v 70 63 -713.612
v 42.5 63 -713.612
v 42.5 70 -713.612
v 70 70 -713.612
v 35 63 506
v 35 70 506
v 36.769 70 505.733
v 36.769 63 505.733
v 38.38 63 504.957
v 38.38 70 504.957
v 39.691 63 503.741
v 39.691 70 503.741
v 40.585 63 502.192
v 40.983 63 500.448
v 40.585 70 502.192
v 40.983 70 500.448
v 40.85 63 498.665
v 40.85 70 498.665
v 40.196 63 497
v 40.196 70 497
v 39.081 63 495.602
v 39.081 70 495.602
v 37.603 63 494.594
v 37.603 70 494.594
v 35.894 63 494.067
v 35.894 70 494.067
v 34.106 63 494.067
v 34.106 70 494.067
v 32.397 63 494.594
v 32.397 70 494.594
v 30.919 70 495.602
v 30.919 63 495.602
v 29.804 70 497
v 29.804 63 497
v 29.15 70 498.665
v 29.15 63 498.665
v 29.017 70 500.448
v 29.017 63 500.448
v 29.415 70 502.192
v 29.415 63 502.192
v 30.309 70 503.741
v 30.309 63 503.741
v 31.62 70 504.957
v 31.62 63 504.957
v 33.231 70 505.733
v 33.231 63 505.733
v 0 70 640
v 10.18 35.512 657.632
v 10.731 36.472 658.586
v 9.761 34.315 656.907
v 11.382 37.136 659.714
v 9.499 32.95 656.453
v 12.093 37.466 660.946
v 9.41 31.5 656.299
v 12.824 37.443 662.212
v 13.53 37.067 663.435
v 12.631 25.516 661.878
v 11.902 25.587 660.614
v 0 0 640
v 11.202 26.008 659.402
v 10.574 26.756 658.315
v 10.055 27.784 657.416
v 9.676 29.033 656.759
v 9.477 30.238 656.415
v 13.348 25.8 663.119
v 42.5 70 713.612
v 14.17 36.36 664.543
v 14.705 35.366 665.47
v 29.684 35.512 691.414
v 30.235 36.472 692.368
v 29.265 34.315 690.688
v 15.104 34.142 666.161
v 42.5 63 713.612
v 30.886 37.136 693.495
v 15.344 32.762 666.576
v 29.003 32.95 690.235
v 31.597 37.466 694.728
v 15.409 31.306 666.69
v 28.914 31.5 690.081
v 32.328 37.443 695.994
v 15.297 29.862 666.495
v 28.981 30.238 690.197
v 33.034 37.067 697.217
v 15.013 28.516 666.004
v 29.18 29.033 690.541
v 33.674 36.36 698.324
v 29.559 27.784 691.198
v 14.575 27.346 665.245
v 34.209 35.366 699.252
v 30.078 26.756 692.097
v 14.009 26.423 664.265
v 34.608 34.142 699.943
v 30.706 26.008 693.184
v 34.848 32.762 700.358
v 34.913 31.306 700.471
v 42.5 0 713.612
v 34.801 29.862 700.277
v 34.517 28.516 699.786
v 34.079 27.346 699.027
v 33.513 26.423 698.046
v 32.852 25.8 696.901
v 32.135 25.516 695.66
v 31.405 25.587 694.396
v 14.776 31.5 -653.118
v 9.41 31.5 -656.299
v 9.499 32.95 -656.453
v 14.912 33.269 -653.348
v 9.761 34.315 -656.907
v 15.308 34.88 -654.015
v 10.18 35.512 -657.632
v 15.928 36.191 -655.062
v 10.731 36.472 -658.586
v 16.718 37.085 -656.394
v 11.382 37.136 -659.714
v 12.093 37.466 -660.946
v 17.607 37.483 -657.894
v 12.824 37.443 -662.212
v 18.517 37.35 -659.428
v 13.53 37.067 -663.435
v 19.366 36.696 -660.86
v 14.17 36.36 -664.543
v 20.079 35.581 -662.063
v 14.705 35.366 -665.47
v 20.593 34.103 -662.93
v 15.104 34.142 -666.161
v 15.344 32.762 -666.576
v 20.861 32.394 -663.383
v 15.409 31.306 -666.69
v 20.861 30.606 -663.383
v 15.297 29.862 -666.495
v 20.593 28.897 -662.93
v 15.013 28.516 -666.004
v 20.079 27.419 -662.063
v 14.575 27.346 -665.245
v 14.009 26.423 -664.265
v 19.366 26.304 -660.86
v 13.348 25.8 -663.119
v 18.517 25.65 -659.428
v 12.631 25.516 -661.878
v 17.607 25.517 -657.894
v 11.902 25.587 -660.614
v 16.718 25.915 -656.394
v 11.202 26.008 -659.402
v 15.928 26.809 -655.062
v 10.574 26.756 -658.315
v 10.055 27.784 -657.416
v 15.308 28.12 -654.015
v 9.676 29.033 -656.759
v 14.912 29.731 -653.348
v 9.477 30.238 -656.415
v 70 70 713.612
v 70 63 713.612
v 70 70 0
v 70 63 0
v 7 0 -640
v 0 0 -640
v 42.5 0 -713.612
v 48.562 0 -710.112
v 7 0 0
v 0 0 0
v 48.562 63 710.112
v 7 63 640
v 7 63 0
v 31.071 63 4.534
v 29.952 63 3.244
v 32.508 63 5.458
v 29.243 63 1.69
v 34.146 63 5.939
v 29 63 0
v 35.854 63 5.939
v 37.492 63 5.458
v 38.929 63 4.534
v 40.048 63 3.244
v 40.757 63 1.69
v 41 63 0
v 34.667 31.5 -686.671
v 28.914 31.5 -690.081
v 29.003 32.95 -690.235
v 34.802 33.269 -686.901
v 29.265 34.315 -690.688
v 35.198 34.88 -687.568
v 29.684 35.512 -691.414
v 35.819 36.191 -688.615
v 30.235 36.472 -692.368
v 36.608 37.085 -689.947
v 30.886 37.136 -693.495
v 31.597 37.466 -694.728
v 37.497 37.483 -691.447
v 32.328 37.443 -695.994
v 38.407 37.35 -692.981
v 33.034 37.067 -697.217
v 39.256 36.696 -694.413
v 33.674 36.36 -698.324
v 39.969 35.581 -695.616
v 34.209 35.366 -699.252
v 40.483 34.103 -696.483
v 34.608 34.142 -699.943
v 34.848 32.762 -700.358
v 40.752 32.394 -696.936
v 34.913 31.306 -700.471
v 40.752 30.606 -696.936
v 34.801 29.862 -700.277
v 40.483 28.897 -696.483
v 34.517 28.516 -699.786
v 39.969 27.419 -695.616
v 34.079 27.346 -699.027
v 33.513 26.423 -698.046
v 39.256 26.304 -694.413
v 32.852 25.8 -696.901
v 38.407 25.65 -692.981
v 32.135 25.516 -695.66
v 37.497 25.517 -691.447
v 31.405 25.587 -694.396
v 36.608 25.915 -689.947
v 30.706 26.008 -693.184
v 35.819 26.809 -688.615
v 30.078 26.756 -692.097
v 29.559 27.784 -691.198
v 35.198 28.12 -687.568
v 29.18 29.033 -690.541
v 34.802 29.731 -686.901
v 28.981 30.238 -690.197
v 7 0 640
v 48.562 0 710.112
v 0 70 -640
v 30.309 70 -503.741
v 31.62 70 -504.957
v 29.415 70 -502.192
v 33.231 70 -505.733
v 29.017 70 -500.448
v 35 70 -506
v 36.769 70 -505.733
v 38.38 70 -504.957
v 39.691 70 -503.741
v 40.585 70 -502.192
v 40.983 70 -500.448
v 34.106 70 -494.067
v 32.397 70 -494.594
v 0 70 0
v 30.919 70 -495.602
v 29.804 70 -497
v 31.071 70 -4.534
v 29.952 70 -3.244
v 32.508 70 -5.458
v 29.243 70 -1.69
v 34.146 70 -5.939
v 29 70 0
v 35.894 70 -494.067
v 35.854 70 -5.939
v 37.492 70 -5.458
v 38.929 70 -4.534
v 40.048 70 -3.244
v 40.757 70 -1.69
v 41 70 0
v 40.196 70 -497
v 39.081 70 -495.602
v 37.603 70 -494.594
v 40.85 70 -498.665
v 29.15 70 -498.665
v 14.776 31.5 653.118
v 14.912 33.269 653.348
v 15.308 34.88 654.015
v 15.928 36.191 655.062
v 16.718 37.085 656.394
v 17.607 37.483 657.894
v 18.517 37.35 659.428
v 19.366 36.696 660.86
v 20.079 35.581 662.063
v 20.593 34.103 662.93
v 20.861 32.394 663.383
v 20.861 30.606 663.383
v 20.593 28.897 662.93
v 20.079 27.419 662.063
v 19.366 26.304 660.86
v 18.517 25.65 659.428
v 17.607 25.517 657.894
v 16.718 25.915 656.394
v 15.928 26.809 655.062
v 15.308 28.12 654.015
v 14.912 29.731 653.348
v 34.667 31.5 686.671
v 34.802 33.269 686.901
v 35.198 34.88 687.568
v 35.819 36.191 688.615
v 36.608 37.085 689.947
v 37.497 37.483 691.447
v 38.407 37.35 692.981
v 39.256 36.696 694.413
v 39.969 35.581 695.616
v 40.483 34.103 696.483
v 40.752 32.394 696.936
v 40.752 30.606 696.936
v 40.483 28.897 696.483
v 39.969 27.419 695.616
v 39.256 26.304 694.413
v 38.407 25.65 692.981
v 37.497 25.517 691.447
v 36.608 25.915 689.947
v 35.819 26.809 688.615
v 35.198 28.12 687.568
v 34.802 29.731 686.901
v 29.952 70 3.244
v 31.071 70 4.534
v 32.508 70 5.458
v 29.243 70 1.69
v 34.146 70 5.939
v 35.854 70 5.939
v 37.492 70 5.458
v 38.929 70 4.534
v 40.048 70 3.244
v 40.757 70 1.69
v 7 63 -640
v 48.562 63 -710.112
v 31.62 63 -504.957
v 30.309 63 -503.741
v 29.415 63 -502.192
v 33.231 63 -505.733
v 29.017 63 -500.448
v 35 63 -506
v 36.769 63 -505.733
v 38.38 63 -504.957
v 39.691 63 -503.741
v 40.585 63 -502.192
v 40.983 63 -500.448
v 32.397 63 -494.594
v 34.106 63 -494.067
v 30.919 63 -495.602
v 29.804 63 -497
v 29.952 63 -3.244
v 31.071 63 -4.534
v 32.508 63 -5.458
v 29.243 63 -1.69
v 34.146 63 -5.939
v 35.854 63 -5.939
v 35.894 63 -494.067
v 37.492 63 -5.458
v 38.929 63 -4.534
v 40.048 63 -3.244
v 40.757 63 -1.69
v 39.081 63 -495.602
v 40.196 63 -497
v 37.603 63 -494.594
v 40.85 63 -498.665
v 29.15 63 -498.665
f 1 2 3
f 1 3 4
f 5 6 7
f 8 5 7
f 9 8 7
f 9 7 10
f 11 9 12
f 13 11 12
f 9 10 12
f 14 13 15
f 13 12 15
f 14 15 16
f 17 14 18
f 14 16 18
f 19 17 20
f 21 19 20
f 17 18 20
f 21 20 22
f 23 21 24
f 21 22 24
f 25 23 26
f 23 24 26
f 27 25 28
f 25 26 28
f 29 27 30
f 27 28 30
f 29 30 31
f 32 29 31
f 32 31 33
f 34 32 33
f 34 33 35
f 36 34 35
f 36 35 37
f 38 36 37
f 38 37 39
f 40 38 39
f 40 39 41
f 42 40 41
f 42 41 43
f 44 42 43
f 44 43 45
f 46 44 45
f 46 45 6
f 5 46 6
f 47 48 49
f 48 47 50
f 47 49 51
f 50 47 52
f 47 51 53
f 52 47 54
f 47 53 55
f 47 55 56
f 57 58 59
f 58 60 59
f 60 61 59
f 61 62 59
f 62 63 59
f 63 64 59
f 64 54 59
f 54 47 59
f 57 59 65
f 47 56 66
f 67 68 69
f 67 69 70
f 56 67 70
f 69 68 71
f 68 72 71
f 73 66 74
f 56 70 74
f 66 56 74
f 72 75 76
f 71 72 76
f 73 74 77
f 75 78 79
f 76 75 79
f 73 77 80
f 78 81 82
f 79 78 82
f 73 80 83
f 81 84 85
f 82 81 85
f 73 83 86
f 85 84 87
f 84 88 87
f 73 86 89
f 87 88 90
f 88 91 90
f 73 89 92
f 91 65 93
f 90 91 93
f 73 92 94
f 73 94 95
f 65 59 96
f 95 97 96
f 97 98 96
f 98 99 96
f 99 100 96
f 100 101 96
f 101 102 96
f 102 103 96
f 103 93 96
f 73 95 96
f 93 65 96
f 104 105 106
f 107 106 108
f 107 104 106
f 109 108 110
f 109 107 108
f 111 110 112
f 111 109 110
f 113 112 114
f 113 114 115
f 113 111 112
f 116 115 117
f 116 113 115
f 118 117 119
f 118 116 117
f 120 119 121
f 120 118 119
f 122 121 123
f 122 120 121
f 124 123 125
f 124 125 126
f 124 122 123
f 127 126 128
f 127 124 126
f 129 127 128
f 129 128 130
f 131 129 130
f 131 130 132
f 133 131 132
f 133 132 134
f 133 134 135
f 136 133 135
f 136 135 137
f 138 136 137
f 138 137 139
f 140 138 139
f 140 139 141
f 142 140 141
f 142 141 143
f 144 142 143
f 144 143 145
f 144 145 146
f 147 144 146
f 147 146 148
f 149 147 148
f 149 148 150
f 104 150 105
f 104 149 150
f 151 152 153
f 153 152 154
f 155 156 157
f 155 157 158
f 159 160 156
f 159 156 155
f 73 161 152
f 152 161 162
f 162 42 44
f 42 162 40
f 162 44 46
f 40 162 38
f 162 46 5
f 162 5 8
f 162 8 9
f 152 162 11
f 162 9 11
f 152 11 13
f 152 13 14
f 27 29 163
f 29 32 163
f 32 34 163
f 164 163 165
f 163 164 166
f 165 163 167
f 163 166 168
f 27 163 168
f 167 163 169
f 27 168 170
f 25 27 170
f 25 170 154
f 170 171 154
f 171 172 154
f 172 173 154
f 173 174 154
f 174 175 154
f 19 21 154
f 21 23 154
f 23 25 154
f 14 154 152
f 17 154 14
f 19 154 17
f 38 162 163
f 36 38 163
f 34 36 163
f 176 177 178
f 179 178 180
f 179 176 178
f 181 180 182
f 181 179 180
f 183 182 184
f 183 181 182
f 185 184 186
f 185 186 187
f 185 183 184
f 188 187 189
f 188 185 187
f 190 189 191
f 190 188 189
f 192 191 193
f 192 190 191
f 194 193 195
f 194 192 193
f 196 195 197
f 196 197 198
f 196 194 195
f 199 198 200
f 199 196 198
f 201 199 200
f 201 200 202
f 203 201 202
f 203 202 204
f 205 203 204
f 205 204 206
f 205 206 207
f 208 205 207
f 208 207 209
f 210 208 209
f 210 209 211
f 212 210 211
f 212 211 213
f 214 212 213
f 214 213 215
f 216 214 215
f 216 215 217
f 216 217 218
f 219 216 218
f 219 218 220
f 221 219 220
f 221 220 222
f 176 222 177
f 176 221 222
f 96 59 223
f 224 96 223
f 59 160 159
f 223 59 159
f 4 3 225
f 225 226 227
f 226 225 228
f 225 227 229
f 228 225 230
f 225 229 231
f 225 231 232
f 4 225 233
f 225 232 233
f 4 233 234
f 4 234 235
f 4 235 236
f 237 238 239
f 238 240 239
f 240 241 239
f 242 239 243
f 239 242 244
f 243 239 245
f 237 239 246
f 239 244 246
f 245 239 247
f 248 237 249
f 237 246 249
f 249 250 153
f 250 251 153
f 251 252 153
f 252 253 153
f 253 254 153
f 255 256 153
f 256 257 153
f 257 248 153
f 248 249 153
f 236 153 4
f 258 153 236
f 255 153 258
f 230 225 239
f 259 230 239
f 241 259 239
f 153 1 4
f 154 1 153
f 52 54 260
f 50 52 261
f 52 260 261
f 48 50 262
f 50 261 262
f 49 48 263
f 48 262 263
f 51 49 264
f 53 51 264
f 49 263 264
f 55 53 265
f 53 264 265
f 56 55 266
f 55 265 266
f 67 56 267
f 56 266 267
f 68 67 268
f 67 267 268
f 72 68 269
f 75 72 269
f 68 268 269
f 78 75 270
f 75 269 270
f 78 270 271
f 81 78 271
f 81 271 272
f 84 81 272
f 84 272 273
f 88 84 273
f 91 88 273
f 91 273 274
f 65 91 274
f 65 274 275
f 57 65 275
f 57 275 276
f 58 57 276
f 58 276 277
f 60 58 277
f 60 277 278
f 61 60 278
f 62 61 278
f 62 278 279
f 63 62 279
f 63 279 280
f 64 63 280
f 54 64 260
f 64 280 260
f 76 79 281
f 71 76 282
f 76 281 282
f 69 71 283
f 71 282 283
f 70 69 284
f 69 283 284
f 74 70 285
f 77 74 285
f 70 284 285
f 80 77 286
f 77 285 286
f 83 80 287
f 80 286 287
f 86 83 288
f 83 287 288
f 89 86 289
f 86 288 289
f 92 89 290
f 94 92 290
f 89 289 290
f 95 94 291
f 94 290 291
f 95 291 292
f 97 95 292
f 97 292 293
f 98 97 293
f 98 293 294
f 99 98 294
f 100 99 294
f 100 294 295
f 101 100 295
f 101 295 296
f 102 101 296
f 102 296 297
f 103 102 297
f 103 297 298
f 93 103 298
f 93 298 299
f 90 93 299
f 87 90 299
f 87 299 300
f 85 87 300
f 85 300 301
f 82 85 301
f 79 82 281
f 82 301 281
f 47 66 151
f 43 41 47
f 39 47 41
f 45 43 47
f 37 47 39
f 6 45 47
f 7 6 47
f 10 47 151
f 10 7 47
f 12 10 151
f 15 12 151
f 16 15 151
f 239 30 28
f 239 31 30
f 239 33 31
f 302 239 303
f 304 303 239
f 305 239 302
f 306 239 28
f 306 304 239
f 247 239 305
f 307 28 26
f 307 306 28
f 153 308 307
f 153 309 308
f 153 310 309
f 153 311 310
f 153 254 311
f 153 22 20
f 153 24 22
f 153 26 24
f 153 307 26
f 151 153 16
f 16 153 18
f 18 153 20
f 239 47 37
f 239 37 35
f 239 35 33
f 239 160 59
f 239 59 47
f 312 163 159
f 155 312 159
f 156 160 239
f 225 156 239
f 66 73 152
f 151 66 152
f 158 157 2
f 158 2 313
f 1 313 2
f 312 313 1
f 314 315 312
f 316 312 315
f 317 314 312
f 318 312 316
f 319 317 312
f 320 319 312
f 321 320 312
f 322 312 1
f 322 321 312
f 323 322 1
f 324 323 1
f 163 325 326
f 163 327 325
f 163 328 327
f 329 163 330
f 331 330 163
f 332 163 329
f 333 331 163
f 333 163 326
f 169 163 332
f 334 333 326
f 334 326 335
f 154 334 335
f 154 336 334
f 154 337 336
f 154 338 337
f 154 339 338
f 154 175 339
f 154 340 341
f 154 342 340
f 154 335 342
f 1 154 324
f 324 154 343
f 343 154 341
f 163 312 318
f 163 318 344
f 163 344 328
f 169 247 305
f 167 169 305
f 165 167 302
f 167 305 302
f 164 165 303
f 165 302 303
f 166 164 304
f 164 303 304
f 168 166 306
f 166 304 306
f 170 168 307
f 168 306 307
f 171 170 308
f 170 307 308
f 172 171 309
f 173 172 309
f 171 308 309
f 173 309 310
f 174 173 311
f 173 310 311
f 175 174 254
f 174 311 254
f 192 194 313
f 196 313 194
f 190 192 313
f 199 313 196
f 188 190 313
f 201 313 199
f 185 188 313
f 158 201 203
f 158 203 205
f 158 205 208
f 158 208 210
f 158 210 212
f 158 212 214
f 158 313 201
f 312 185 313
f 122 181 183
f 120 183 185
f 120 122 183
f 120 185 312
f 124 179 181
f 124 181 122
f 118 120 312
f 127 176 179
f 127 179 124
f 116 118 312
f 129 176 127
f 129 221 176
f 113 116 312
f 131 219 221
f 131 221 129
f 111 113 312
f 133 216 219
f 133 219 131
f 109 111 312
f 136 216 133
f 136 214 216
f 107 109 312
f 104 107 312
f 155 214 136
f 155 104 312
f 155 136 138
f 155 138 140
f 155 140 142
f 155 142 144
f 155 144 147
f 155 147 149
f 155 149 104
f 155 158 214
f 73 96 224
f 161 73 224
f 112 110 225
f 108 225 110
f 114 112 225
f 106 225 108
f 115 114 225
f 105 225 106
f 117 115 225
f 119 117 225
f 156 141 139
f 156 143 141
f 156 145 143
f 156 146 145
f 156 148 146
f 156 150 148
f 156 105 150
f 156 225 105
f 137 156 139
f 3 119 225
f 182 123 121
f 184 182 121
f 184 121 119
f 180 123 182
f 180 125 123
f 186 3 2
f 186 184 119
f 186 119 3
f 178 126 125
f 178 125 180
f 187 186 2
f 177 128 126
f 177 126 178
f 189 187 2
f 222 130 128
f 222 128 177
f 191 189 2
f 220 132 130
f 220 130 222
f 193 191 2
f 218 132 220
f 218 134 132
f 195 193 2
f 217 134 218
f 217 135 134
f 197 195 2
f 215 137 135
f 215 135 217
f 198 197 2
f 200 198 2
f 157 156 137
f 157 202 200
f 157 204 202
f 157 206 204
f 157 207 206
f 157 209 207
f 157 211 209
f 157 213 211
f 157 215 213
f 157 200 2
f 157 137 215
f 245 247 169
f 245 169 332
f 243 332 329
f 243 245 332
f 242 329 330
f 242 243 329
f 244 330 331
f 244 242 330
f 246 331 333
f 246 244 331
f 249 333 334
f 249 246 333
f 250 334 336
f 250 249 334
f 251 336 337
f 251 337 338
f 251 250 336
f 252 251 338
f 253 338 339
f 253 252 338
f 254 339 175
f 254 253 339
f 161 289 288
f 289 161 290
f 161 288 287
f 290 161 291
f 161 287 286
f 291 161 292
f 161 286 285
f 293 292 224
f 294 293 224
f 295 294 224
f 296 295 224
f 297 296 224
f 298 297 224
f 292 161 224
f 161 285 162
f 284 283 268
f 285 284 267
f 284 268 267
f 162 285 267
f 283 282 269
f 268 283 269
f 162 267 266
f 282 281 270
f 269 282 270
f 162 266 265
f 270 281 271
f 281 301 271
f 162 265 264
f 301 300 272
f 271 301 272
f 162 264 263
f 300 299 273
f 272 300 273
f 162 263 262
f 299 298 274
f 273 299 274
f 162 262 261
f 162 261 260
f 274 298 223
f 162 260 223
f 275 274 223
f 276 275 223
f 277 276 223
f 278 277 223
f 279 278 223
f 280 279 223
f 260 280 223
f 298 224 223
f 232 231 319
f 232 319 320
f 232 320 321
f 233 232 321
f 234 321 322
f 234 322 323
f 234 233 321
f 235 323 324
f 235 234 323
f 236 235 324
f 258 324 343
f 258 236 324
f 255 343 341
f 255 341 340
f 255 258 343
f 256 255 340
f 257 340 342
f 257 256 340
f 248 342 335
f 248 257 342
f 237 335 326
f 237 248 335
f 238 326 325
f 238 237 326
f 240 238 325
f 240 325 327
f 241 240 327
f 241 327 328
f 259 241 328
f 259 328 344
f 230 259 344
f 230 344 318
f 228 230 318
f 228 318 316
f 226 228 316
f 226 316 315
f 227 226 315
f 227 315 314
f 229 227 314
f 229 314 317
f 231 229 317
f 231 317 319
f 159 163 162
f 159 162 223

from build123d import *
from build123d.topology import SkipClean

# Parameters (mm, degrees)
BOSS_EXTRUDE1_DEPTH = 640
SKETCH22_R          = 6
CUT_EXTRUDE4_DEPTH  = 10
BOSS_EXTRUDE2_DEPTH = 63
BOSS_EXTRUDE3_DEPTH = 7
SKETCH26_R          = 6
CUT_EXTRUDE5_DEPTH  = 7


with BuildPart() as part:
    # Sketch1 → Boss-Extrude1 (new body)
    with BuildSketch(Plane.XY):
        Polygon((0, 0), (0, 70), (70, 70), (70, 63), (7, 63), (7, 0), align=None)
    extrude(amount=BOSS_EXTRUDE1_DEPTH)

    # Sketch22 → Cut-Extrude4 (cut)
    with BuildSketch(Plane(origin=(0, 70, 0), x_dir=(1, 0, 0), z_dir=(0, 1, 0))):
        with Locations((35, 0)):
            Circle(SKETCH22_R)
        with Locations((35, 500)):
            Circle(SKETCH22_R)
        with Locations(Location((35, -500, 0), (0, 0, 270))):
            Circle(SKETCH22_R)
    extrude(amount=-CUT_EXTRUDE4_DEPTH, mode=Mode.SUBTRACT)

    # Sketch23 → Boss-Extrude2 (add)
    with BuildSketch(Plane(origin=(0, 0, 0), x_dir=(1, 0, 0), z_dir=(0, 1, 0))):
        Polygon((0, -640), (42.5, -713.612159322), (48.562177826, -710.112159322), (7, -640), align=None)
    extrude(amount=BOSS_EXTRUDE2_DEPTH)

    # Sketch25 → Boss-Extrude3 (add)
    with BuildSketch(Plane(origin=(0, 63, 0), x_dir=(1, 0, 0), z_dir=(0, 1, 0))):
        Polygon((70, -640), (0, -640), (42.5, -713.612159322), (70, -713.612159322), align=None)
    extrude(amount=BOSS_EXTRUDE3_DEPTH)

    # Sketch26 → Cut-Extrude5 (cut)
    with BuildSketch(Plane(origin=(-275.556719825, 0, 163.348804279), x_dir=(-0.5099316128113042, 0, -0.8602149442178172), z_dir=(0.8602149442178172, 0, -0.5099316128113042))):
        with Locations((-614.36248118, 31.5)):
            Circle(SKETCH26_R)
        with Locations((-575.357085589, 31.5)):
            Circle(SKETCH26_R)
    extrude(amount=-CUT_EXTRUDE5_DEPTH, mode=Mode.SUBTRACT)

    # Mirror1: part across plane


with BuildPart() as part_1:
    with SkipClean():  # the faces are left unmerged after this step: merging them gives an invalid solid
        add(part.part)
        add(part.part.mirror(Plane.XY))


solid = part_1.part
